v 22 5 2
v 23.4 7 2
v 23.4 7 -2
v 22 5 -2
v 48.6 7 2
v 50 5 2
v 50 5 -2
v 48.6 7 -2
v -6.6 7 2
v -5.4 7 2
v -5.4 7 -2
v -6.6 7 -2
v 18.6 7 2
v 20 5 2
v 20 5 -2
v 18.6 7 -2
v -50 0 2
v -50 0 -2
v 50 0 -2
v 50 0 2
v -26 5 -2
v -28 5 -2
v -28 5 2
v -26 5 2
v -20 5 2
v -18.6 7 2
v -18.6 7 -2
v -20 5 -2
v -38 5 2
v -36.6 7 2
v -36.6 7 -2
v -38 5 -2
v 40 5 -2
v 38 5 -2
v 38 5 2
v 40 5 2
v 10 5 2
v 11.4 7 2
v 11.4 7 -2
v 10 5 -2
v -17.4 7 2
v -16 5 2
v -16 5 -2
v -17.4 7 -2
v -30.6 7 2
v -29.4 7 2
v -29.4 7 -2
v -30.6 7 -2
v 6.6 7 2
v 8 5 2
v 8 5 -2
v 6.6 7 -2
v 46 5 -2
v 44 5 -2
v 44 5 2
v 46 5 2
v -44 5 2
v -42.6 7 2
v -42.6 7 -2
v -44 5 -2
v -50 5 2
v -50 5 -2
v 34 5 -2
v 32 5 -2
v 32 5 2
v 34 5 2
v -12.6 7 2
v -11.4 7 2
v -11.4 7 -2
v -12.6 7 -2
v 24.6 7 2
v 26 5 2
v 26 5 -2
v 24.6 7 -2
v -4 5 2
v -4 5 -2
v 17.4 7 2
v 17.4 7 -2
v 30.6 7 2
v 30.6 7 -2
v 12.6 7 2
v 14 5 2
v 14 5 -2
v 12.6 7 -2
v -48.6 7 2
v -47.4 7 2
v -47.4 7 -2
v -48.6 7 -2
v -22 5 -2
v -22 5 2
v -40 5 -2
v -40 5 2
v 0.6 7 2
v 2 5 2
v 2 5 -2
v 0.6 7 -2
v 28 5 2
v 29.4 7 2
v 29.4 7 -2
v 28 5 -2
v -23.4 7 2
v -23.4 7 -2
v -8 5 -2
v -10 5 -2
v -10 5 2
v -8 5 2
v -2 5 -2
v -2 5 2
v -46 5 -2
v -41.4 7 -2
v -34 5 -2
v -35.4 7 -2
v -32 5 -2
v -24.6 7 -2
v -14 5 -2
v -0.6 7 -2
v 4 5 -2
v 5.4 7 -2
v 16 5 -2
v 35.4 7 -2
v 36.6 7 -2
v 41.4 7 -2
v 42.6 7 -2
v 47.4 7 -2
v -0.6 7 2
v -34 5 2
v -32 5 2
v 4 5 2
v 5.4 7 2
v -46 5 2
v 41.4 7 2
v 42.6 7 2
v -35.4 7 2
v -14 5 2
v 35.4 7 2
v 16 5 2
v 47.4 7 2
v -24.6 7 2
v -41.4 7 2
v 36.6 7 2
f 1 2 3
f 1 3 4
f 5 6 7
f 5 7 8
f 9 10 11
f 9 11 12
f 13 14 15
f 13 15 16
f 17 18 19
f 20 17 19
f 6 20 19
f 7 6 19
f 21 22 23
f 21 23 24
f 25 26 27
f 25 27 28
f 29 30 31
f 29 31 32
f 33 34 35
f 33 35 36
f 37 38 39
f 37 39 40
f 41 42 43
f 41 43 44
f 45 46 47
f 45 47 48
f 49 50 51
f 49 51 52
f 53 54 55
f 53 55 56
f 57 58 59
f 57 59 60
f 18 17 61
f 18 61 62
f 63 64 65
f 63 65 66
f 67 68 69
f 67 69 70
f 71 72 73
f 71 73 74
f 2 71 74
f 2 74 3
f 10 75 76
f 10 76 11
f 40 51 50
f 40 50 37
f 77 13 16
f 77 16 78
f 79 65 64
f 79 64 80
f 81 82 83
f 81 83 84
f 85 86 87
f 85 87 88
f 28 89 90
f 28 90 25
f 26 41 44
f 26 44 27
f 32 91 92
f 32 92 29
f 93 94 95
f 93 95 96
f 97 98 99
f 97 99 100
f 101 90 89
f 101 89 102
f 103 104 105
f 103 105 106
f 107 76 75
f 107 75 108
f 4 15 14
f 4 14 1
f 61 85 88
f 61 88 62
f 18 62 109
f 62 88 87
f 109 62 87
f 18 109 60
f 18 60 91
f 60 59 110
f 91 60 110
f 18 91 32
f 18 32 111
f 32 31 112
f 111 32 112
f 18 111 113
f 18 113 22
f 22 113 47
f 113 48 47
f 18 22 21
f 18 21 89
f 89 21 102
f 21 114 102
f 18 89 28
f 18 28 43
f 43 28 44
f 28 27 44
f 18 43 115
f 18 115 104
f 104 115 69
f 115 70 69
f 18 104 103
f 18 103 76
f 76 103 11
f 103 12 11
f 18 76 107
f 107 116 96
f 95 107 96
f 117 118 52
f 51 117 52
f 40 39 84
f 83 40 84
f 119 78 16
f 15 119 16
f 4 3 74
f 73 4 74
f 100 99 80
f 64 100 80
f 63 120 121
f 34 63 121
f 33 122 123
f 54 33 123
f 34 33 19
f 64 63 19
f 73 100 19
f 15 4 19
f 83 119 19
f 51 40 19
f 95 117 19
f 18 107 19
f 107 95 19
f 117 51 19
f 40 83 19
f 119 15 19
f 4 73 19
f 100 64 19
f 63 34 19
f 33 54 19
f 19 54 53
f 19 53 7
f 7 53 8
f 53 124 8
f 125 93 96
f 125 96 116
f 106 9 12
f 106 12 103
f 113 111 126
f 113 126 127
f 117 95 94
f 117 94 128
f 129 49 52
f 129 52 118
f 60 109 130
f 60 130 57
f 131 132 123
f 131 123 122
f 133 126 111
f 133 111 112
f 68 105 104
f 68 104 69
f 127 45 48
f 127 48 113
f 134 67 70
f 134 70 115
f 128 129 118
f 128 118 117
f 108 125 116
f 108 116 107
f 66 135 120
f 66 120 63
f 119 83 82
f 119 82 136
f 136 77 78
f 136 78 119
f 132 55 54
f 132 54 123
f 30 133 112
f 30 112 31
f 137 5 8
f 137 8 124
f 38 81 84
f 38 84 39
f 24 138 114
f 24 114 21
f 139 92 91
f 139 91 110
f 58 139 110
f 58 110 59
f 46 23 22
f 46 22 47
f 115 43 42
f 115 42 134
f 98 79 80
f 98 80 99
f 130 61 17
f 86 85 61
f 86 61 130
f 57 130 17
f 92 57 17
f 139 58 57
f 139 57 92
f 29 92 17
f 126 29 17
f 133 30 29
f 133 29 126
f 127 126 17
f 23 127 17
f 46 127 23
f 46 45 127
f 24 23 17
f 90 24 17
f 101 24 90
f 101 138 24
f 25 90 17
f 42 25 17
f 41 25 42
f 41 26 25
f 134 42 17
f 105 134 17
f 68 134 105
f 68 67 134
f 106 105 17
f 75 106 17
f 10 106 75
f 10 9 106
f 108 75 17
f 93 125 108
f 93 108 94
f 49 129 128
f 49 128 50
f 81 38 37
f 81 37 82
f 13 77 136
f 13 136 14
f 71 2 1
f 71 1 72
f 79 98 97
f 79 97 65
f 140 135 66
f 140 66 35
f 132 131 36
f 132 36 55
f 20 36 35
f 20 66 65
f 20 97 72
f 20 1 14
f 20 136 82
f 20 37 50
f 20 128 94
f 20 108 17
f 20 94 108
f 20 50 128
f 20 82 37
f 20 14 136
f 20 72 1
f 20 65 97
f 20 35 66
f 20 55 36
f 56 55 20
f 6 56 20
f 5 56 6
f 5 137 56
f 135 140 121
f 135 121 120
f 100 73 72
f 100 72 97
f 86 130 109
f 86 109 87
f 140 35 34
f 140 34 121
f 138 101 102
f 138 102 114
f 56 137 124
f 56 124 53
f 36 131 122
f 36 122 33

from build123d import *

# Parameters (mm, degrees)
SKETCH2_W           = 100
SKETCH2_H           = 4
BOSS_EXTRUDE1_DEPTH = 5
BOSS_EXTRUDE2_DEPTH = 4


with BuildPart() as part:
    # Sketch2 → Boss-Extrude1 (new body)
    with BuildSketch(Plane(origin=(0, 0, 0), x_dir=(1, 0, 0), z_dir=(0, 1, 0))):
        Rectangle(SKETCH2_W, SKETCH2_H)
    extrude(amount=BOSS_EXTRUDE1_DEPTH)

    # Sketch3 → Boss-Extrude2 (add)
    with BuildSketch(Plane.XY.offset(2)):
        Polygon((-50, 5), (-46, 5), (-47.4, 7), (-48.6, 7), align=None)
        Polygon((-42.6, 7), (-44, 5), (-40, 5), (-41.4, 7), align=None)
        Polygon((-36.6, 7), (-38, 5), (-34, 5), (-35.4, 7), align=None)
        Polygon((-30.6, 7), (-32, 5), (-28, 5), (-29.4, 7), align=None)
        Polygon((-24.6, 7), (-26, 5), (-22, 5), (-23.4, 7), align=None)
        Polygon((-18.6, 7), (-20, 5), (-16, 5), (-17.4, 7), align=None)
        Polygon((-12.6, 7), (-14, 5), (-10, 5), (-11.4, 7), align=None)
        Polygon((-6.6, 7), (-8, 5), (-4, 5), (-5.4, 7), align=None)
        Polygon((-0.6, 7), (-2, 5), (2, 5), (0.6, 7), align=None)
        Polygon((5.4, 7), (4, 5), (8, 5), (6.6, 7), align=None)
        Polygon((11.4, 7), (10, 5), (14, 5), (12.6, 7), align=None)
        Polygon((17.4, 7), (16, 5), (20, 5), (18.6, 7), align=None)
        Polygon((23.4, 7), (22, 5), (26, 5), (24.6, 7), align=None)
        Polygon((29.4, 7), (28, 5), (32, 5), (30.6, 7), align=None)
        Polygon((35.4, 7), (34, 5), (38, 5), (36.6, 7), align=None)
        Polygon((41.4, 7), (40, 5), (44, 5), (42.6, 7), align=None)
        Polygon((47.4, 7), (46, 5), (50, 5), (48.6, 7), align=None)
    extrude(amount=-BOSS_EXTRUDE2_DEPTH)


solid = part.part
